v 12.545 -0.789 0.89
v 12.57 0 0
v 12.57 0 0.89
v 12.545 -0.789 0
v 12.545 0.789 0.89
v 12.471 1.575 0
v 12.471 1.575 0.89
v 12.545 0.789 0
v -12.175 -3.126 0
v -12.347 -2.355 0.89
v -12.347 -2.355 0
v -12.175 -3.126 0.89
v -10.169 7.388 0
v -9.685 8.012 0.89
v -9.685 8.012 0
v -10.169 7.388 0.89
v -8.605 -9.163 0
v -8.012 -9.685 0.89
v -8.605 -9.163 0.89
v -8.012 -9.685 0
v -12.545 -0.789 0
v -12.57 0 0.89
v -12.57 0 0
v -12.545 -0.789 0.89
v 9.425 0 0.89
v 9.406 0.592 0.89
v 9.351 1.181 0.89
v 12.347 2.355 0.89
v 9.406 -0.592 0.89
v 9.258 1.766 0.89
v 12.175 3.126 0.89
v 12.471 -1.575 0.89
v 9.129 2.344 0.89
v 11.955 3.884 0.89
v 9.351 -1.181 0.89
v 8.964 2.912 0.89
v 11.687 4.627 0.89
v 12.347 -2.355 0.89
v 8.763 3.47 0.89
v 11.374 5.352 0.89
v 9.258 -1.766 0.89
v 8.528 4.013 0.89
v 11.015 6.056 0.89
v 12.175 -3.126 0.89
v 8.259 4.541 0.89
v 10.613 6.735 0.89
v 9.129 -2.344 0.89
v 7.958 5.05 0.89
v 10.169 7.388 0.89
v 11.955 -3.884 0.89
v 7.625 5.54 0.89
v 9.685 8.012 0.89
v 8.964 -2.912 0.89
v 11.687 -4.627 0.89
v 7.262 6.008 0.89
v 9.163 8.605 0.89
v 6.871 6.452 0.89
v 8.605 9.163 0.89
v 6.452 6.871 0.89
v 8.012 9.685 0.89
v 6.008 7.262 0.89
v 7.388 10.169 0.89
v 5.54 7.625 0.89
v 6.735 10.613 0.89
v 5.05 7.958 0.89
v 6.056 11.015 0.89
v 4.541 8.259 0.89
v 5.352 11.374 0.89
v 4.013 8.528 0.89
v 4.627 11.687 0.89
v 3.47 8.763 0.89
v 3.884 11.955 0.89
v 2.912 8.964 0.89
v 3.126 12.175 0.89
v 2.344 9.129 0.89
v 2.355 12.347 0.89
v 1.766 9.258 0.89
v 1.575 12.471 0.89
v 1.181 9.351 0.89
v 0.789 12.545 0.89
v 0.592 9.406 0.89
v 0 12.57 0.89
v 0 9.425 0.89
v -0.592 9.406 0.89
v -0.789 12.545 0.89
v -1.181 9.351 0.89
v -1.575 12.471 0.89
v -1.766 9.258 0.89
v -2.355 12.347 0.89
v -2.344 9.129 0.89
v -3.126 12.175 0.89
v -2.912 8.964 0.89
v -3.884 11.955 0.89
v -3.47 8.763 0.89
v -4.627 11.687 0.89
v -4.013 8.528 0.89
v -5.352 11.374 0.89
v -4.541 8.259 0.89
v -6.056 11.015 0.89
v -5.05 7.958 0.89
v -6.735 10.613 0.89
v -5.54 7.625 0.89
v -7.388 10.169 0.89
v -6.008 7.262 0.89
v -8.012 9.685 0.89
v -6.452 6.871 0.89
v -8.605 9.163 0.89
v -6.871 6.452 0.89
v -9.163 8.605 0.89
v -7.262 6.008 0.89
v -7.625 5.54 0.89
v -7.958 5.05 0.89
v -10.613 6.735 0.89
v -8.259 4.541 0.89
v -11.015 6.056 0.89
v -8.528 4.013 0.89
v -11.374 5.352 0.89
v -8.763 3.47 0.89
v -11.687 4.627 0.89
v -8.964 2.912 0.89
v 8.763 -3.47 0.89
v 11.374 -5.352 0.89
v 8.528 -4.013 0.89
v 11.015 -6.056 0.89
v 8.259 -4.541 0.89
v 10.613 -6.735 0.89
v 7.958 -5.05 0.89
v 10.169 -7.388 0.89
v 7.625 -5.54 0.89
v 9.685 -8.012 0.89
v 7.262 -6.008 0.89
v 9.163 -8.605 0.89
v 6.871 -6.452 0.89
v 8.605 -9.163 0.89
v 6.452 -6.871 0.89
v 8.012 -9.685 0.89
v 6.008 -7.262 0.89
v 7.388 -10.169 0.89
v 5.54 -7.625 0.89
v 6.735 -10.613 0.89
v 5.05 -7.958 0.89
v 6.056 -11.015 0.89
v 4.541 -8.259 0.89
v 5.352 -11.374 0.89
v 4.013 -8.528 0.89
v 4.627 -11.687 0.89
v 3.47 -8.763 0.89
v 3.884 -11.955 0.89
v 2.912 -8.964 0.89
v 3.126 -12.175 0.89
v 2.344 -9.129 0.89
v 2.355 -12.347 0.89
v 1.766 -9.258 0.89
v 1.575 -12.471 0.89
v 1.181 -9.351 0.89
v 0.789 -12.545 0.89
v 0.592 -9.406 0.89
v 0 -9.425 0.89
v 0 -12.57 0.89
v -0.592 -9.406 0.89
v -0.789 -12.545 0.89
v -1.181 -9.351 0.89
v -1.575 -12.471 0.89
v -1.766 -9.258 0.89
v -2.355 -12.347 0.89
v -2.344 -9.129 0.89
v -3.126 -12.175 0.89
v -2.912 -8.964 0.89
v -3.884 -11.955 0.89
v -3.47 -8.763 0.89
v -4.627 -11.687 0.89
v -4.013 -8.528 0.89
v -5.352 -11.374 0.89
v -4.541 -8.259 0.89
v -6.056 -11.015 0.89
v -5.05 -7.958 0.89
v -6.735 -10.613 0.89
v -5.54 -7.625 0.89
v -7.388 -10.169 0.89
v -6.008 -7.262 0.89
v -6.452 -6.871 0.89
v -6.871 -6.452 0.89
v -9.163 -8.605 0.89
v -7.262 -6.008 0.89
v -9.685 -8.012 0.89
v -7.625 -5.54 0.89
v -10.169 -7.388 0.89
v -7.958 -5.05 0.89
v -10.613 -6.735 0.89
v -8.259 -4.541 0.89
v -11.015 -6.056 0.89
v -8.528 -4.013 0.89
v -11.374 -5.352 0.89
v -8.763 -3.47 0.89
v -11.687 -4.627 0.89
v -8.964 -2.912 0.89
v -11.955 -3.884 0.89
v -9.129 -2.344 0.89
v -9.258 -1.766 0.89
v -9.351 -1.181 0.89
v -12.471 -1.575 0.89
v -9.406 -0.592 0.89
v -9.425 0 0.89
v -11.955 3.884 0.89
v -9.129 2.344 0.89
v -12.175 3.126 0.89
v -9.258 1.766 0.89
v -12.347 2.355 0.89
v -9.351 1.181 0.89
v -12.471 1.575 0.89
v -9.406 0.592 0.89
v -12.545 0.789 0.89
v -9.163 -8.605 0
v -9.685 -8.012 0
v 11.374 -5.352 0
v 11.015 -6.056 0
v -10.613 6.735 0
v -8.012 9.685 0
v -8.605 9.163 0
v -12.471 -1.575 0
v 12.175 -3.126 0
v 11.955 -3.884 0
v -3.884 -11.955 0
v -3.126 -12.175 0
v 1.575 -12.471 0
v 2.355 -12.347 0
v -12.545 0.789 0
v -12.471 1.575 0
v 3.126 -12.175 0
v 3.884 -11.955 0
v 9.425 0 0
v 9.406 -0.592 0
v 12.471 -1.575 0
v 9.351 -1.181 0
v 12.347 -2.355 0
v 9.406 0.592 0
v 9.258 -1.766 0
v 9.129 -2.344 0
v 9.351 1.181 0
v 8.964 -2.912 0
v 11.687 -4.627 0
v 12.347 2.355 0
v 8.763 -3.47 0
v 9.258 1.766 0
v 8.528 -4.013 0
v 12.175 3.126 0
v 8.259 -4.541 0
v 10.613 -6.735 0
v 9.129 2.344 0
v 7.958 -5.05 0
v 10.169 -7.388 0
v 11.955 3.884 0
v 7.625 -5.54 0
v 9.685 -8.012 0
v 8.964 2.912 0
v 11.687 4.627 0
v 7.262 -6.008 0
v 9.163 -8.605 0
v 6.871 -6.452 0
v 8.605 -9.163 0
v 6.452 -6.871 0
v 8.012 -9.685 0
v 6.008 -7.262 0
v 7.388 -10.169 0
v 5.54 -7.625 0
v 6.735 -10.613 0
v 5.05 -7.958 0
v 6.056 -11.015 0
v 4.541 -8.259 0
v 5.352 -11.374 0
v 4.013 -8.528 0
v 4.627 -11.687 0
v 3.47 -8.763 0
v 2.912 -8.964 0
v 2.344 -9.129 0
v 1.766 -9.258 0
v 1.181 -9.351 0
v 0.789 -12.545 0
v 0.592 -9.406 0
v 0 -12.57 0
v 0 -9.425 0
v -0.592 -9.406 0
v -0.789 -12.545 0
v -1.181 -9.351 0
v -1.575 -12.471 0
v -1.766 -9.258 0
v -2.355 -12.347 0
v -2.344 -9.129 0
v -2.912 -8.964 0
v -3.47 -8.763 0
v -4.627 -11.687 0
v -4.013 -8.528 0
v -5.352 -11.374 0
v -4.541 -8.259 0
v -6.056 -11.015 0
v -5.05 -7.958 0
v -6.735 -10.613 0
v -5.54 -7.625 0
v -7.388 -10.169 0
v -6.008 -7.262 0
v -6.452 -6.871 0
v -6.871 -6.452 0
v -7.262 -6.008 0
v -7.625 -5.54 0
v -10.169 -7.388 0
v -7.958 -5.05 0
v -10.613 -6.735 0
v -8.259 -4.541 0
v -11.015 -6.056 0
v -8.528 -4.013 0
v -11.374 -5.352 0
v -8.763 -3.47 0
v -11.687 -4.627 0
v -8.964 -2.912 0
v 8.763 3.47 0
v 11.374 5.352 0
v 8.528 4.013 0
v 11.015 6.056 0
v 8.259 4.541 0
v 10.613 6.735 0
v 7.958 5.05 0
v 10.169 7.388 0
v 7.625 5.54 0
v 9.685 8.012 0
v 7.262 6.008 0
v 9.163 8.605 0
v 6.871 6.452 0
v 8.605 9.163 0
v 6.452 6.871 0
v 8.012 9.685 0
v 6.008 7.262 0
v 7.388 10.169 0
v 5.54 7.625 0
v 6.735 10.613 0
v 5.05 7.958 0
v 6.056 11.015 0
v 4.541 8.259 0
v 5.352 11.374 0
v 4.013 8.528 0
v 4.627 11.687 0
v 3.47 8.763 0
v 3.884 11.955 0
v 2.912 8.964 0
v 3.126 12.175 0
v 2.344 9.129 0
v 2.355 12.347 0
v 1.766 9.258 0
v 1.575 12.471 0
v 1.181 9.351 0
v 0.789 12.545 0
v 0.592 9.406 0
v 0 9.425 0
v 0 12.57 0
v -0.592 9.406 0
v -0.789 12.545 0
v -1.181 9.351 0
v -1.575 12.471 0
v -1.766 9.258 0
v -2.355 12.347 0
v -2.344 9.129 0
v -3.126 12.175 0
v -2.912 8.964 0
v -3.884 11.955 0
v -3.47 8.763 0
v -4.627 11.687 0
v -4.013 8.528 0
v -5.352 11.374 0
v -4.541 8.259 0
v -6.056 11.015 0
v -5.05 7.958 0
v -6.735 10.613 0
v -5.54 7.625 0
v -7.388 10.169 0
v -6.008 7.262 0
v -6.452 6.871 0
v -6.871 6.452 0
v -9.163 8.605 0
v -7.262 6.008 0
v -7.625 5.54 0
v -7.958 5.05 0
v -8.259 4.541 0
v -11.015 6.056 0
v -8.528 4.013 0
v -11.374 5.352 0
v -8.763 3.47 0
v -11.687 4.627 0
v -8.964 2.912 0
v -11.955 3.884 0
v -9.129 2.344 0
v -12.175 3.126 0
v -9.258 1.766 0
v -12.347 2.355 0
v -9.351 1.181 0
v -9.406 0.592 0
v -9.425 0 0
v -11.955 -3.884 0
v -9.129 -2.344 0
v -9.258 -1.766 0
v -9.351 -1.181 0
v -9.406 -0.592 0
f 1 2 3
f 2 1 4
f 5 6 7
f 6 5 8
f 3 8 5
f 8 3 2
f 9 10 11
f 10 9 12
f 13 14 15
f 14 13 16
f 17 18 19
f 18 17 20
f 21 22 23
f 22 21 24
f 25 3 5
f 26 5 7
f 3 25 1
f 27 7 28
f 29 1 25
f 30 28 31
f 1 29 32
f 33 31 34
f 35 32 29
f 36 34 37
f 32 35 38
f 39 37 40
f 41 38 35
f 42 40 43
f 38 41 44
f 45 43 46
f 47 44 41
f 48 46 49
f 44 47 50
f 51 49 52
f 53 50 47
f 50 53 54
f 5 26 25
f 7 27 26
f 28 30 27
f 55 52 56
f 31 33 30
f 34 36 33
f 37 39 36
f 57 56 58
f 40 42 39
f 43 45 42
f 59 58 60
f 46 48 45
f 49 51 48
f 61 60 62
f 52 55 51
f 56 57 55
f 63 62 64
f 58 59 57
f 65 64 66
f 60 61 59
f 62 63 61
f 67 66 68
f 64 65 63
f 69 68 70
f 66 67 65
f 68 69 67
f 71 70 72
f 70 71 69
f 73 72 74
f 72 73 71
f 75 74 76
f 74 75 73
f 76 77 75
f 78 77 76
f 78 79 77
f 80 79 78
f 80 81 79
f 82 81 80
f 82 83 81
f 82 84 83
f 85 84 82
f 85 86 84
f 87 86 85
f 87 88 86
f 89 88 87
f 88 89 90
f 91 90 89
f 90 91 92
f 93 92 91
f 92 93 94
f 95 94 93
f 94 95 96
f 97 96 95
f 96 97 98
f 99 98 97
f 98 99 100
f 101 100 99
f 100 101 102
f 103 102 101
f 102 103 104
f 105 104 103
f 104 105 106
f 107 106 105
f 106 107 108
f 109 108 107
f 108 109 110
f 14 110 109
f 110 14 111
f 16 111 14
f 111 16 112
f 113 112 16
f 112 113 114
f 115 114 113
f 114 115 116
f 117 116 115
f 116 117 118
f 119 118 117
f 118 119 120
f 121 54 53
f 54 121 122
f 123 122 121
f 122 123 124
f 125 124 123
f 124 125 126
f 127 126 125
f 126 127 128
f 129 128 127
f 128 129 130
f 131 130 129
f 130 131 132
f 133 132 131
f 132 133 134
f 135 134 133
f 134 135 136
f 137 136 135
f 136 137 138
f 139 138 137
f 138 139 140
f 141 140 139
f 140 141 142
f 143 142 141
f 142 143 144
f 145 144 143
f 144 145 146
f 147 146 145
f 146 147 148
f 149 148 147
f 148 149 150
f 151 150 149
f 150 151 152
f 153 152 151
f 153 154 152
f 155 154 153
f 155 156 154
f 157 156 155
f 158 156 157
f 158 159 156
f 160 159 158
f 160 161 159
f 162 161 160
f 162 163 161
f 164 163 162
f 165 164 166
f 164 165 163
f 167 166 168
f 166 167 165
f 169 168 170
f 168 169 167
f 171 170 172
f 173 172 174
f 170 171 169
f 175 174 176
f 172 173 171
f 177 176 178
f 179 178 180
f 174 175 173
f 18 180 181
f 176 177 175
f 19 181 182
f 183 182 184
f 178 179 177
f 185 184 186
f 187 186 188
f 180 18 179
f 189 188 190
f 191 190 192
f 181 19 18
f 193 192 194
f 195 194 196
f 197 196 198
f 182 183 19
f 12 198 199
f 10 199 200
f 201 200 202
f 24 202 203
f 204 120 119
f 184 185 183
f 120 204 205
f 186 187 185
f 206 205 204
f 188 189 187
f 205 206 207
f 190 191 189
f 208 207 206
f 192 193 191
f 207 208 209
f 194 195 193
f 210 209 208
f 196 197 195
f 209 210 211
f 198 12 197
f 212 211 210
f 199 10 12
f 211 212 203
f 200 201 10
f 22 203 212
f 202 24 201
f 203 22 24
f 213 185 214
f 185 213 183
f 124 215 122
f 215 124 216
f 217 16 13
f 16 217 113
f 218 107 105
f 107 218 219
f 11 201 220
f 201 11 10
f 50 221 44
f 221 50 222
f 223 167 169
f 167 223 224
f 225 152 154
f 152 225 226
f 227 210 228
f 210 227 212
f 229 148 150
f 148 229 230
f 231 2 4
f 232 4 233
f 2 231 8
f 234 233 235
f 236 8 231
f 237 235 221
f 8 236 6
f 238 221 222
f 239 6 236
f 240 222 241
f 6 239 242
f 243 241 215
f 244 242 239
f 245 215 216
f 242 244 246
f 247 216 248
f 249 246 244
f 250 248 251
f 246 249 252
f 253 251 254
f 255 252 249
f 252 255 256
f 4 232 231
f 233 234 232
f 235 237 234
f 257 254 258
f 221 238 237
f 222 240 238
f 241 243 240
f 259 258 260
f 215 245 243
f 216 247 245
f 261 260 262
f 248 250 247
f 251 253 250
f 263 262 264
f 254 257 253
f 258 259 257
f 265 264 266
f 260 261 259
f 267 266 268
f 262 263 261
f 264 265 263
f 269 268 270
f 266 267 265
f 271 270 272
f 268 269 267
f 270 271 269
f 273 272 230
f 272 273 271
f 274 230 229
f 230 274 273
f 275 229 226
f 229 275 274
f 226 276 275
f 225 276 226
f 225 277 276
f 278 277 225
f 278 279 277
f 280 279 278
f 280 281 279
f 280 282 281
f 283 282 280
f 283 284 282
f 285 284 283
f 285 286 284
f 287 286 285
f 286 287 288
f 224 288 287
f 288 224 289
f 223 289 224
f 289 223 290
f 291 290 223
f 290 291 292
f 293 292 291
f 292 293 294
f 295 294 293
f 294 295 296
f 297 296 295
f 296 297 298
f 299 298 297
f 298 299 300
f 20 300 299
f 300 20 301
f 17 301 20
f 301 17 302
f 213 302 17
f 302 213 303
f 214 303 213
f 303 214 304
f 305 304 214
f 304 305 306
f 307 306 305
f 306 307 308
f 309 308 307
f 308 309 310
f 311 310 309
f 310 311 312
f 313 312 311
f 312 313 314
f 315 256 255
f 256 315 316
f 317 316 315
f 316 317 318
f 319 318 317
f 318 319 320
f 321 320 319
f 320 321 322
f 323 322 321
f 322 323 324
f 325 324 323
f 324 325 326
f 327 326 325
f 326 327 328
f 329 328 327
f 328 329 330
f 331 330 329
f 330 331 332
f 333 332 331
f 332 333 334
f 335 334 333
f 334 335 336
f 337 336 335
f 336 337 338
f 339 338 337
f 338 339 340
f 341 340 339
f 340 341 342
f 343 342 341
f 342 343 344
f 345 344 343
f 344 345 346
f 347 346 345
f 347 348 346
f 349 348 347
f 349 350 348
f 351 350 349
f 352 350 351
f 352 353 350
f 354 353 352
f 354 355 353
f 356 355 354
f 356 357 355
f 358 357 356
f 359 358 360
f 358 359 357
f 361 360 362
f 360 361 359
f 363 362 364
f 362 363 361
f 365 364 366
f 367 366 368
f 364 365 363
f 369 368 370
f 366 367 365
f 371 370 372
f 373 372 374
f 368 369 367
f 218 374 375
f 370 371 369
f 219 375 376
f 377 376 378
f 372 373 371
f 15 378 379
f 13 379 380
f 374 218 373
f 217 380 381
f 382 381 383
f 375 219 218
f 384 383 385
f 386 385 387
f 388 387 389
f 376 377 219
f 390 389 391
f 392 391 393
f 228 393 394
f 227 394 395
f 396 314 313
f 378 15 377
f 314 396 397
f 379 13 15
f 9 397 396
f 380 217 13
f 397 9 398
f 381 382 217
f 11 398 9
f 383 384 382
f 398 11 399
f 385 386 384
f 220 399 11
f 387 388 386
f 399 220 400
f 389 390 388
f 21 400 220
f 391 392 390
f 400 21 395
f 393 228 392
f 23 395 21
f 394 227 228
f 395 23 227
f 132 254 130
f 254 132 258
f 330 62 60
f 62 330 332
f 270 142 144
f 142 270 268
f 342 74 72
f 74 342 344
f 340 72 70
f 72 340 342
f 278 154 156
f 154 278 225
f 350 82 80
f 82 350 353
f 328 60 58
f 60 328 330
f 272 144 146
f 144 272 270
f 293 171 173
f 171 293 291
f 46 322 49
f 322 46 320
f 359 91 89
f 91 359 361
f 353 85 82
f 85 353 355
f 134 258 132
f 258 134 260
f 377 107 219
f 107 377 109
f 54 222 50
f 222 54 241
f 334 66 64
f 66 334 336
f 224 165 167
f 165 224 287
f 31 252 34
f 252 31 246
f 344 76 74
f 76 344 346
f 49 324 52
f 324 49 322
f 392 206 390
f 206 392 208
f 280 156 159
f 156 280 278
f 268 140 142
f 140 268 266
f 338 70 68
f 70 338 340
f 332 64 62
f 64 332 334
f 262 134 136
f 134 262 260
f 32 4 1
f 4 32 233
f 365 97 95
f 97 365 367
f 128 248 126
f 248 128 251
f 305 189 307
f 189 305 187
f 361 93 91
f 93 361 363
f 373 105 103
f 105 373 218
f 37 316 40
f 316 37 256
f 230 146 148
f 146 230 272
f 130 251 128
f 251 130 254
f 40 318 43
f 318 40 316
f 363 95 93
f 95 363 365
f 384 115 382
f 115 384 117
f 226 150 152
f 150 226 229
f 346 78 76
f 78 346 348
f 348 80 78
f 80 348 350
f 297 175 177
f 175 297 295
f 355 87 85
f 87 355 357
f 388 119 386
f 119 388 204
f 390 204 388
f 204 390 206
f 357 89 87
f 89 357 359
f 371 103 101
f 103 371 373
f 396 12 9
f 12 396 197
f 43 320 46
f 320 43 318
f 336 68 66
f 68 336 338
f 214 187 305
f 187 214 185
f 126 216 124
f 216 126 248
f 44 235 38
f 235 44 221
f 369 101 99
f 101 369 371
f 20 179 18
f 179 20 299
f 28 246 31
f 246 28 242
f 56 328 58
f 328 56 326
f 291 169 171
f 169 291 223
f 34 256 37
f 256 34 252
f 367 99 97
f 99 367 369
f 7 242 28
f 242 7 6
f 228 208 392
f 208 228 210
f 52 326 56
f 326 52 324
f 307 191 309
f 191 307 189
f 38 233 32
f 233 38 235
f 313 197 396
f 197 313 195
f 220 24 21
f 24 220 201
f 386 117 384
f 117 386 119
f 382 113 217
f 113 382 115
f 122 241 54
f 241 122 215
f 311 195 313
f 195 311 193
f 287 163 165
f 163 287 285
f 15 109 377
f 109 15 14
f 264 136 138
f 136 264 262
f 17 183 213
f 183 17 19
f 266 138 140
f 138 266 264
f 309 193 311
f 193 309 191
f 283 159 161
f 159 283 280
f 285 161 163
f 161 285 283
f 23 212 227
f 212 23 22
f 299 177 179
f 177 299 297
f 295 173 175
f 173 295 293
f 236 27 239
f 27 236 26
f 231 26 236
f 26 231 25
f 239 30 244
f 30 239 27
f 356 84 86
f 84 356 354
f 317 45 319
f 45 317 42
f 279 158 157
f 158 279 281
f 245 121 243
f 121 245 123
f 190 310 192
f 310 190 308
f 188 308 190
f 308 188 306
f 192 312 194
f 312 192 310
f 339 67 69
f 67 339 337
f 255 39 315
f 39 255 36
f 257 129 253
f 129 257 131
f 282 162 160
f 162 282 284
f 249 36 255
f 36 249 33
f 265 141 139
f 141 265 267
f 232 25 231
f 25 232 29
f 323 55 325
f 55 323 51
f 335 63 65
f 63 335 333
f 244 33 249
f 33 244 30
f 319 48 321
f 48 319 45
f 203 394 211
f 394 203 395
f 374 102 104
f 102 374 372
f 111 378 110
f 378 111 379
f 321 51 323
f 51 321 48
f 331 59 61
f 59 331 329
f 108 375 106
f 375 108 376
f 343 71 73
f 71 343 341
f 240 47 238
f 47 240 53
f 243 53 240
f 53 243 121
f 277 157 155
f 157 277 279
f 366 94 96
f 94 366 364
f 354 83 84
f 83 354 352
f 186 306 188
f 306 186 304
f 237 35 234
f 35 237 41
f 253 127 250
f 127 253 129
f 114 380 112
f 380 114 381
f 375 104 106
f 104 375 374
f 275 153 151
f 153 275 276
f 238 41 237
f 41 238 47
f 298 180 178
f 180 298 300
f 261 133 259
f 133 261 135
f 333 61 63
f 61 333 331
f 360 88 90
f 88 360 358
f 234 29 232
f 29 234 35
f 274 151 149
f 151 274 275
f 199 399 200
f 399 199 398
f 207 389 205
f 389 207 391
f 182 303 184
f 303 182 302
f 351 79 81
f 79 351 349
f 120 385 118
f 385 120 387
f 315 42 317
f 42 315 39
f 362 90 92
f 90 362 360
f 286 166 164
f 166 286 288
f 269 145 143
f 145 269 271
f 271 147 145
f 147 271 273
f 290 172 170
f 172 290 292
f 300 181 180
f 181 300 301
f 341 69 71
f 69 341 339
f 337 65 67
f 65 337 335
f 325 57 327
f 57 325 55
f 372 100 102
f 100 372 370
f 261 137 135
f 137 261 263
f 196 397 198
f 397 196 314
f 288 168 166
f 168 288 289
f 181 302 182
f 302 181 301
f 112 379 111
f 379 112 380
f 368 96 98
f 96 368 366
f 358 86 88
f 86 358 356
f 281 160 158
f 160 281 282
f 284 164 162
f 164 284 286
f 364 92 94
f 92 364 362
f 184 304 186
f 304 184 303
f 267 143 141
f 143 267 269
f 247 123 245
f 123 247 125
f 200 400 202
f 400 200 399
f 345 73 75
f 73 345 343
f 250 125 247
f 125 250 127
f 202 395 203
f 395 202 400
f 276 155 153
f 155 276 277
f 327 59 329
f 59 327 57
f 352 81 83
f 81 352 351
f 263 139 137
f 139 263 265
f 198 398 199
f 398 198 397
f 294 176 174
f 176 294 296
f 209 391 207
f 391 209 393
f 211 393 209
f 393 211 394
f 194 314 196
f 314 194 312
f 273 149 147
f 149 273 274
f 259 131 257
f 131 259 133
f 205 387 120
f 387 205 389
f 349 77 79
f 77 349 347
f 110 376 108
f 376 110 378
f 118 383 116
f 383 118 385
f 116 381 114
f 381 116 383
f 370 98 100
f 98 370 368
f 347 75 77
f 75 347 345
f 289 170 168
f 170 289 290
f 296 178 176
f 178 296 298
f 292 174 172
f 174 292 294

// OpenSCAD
/*
Description: As it looks like Trucore hardware is no longer available, this is an attempt to model the truCore motors so that rocketers can get spare parts with help from a machinist
Author: Boris du Reau
Date: 23/07/2018
motor type: 29 mm 
part: Washer
This is used for all the 29mm motors
washer outside diameter: 25.14 mm
washer height: 0.89 mm
washer inside diameter: 18.85 mm
*/

$fn=100;
difference () {cylinder (r= 25.14/2, h = 0.89);
cylinder (r=18.85/2, h = 10);
}
